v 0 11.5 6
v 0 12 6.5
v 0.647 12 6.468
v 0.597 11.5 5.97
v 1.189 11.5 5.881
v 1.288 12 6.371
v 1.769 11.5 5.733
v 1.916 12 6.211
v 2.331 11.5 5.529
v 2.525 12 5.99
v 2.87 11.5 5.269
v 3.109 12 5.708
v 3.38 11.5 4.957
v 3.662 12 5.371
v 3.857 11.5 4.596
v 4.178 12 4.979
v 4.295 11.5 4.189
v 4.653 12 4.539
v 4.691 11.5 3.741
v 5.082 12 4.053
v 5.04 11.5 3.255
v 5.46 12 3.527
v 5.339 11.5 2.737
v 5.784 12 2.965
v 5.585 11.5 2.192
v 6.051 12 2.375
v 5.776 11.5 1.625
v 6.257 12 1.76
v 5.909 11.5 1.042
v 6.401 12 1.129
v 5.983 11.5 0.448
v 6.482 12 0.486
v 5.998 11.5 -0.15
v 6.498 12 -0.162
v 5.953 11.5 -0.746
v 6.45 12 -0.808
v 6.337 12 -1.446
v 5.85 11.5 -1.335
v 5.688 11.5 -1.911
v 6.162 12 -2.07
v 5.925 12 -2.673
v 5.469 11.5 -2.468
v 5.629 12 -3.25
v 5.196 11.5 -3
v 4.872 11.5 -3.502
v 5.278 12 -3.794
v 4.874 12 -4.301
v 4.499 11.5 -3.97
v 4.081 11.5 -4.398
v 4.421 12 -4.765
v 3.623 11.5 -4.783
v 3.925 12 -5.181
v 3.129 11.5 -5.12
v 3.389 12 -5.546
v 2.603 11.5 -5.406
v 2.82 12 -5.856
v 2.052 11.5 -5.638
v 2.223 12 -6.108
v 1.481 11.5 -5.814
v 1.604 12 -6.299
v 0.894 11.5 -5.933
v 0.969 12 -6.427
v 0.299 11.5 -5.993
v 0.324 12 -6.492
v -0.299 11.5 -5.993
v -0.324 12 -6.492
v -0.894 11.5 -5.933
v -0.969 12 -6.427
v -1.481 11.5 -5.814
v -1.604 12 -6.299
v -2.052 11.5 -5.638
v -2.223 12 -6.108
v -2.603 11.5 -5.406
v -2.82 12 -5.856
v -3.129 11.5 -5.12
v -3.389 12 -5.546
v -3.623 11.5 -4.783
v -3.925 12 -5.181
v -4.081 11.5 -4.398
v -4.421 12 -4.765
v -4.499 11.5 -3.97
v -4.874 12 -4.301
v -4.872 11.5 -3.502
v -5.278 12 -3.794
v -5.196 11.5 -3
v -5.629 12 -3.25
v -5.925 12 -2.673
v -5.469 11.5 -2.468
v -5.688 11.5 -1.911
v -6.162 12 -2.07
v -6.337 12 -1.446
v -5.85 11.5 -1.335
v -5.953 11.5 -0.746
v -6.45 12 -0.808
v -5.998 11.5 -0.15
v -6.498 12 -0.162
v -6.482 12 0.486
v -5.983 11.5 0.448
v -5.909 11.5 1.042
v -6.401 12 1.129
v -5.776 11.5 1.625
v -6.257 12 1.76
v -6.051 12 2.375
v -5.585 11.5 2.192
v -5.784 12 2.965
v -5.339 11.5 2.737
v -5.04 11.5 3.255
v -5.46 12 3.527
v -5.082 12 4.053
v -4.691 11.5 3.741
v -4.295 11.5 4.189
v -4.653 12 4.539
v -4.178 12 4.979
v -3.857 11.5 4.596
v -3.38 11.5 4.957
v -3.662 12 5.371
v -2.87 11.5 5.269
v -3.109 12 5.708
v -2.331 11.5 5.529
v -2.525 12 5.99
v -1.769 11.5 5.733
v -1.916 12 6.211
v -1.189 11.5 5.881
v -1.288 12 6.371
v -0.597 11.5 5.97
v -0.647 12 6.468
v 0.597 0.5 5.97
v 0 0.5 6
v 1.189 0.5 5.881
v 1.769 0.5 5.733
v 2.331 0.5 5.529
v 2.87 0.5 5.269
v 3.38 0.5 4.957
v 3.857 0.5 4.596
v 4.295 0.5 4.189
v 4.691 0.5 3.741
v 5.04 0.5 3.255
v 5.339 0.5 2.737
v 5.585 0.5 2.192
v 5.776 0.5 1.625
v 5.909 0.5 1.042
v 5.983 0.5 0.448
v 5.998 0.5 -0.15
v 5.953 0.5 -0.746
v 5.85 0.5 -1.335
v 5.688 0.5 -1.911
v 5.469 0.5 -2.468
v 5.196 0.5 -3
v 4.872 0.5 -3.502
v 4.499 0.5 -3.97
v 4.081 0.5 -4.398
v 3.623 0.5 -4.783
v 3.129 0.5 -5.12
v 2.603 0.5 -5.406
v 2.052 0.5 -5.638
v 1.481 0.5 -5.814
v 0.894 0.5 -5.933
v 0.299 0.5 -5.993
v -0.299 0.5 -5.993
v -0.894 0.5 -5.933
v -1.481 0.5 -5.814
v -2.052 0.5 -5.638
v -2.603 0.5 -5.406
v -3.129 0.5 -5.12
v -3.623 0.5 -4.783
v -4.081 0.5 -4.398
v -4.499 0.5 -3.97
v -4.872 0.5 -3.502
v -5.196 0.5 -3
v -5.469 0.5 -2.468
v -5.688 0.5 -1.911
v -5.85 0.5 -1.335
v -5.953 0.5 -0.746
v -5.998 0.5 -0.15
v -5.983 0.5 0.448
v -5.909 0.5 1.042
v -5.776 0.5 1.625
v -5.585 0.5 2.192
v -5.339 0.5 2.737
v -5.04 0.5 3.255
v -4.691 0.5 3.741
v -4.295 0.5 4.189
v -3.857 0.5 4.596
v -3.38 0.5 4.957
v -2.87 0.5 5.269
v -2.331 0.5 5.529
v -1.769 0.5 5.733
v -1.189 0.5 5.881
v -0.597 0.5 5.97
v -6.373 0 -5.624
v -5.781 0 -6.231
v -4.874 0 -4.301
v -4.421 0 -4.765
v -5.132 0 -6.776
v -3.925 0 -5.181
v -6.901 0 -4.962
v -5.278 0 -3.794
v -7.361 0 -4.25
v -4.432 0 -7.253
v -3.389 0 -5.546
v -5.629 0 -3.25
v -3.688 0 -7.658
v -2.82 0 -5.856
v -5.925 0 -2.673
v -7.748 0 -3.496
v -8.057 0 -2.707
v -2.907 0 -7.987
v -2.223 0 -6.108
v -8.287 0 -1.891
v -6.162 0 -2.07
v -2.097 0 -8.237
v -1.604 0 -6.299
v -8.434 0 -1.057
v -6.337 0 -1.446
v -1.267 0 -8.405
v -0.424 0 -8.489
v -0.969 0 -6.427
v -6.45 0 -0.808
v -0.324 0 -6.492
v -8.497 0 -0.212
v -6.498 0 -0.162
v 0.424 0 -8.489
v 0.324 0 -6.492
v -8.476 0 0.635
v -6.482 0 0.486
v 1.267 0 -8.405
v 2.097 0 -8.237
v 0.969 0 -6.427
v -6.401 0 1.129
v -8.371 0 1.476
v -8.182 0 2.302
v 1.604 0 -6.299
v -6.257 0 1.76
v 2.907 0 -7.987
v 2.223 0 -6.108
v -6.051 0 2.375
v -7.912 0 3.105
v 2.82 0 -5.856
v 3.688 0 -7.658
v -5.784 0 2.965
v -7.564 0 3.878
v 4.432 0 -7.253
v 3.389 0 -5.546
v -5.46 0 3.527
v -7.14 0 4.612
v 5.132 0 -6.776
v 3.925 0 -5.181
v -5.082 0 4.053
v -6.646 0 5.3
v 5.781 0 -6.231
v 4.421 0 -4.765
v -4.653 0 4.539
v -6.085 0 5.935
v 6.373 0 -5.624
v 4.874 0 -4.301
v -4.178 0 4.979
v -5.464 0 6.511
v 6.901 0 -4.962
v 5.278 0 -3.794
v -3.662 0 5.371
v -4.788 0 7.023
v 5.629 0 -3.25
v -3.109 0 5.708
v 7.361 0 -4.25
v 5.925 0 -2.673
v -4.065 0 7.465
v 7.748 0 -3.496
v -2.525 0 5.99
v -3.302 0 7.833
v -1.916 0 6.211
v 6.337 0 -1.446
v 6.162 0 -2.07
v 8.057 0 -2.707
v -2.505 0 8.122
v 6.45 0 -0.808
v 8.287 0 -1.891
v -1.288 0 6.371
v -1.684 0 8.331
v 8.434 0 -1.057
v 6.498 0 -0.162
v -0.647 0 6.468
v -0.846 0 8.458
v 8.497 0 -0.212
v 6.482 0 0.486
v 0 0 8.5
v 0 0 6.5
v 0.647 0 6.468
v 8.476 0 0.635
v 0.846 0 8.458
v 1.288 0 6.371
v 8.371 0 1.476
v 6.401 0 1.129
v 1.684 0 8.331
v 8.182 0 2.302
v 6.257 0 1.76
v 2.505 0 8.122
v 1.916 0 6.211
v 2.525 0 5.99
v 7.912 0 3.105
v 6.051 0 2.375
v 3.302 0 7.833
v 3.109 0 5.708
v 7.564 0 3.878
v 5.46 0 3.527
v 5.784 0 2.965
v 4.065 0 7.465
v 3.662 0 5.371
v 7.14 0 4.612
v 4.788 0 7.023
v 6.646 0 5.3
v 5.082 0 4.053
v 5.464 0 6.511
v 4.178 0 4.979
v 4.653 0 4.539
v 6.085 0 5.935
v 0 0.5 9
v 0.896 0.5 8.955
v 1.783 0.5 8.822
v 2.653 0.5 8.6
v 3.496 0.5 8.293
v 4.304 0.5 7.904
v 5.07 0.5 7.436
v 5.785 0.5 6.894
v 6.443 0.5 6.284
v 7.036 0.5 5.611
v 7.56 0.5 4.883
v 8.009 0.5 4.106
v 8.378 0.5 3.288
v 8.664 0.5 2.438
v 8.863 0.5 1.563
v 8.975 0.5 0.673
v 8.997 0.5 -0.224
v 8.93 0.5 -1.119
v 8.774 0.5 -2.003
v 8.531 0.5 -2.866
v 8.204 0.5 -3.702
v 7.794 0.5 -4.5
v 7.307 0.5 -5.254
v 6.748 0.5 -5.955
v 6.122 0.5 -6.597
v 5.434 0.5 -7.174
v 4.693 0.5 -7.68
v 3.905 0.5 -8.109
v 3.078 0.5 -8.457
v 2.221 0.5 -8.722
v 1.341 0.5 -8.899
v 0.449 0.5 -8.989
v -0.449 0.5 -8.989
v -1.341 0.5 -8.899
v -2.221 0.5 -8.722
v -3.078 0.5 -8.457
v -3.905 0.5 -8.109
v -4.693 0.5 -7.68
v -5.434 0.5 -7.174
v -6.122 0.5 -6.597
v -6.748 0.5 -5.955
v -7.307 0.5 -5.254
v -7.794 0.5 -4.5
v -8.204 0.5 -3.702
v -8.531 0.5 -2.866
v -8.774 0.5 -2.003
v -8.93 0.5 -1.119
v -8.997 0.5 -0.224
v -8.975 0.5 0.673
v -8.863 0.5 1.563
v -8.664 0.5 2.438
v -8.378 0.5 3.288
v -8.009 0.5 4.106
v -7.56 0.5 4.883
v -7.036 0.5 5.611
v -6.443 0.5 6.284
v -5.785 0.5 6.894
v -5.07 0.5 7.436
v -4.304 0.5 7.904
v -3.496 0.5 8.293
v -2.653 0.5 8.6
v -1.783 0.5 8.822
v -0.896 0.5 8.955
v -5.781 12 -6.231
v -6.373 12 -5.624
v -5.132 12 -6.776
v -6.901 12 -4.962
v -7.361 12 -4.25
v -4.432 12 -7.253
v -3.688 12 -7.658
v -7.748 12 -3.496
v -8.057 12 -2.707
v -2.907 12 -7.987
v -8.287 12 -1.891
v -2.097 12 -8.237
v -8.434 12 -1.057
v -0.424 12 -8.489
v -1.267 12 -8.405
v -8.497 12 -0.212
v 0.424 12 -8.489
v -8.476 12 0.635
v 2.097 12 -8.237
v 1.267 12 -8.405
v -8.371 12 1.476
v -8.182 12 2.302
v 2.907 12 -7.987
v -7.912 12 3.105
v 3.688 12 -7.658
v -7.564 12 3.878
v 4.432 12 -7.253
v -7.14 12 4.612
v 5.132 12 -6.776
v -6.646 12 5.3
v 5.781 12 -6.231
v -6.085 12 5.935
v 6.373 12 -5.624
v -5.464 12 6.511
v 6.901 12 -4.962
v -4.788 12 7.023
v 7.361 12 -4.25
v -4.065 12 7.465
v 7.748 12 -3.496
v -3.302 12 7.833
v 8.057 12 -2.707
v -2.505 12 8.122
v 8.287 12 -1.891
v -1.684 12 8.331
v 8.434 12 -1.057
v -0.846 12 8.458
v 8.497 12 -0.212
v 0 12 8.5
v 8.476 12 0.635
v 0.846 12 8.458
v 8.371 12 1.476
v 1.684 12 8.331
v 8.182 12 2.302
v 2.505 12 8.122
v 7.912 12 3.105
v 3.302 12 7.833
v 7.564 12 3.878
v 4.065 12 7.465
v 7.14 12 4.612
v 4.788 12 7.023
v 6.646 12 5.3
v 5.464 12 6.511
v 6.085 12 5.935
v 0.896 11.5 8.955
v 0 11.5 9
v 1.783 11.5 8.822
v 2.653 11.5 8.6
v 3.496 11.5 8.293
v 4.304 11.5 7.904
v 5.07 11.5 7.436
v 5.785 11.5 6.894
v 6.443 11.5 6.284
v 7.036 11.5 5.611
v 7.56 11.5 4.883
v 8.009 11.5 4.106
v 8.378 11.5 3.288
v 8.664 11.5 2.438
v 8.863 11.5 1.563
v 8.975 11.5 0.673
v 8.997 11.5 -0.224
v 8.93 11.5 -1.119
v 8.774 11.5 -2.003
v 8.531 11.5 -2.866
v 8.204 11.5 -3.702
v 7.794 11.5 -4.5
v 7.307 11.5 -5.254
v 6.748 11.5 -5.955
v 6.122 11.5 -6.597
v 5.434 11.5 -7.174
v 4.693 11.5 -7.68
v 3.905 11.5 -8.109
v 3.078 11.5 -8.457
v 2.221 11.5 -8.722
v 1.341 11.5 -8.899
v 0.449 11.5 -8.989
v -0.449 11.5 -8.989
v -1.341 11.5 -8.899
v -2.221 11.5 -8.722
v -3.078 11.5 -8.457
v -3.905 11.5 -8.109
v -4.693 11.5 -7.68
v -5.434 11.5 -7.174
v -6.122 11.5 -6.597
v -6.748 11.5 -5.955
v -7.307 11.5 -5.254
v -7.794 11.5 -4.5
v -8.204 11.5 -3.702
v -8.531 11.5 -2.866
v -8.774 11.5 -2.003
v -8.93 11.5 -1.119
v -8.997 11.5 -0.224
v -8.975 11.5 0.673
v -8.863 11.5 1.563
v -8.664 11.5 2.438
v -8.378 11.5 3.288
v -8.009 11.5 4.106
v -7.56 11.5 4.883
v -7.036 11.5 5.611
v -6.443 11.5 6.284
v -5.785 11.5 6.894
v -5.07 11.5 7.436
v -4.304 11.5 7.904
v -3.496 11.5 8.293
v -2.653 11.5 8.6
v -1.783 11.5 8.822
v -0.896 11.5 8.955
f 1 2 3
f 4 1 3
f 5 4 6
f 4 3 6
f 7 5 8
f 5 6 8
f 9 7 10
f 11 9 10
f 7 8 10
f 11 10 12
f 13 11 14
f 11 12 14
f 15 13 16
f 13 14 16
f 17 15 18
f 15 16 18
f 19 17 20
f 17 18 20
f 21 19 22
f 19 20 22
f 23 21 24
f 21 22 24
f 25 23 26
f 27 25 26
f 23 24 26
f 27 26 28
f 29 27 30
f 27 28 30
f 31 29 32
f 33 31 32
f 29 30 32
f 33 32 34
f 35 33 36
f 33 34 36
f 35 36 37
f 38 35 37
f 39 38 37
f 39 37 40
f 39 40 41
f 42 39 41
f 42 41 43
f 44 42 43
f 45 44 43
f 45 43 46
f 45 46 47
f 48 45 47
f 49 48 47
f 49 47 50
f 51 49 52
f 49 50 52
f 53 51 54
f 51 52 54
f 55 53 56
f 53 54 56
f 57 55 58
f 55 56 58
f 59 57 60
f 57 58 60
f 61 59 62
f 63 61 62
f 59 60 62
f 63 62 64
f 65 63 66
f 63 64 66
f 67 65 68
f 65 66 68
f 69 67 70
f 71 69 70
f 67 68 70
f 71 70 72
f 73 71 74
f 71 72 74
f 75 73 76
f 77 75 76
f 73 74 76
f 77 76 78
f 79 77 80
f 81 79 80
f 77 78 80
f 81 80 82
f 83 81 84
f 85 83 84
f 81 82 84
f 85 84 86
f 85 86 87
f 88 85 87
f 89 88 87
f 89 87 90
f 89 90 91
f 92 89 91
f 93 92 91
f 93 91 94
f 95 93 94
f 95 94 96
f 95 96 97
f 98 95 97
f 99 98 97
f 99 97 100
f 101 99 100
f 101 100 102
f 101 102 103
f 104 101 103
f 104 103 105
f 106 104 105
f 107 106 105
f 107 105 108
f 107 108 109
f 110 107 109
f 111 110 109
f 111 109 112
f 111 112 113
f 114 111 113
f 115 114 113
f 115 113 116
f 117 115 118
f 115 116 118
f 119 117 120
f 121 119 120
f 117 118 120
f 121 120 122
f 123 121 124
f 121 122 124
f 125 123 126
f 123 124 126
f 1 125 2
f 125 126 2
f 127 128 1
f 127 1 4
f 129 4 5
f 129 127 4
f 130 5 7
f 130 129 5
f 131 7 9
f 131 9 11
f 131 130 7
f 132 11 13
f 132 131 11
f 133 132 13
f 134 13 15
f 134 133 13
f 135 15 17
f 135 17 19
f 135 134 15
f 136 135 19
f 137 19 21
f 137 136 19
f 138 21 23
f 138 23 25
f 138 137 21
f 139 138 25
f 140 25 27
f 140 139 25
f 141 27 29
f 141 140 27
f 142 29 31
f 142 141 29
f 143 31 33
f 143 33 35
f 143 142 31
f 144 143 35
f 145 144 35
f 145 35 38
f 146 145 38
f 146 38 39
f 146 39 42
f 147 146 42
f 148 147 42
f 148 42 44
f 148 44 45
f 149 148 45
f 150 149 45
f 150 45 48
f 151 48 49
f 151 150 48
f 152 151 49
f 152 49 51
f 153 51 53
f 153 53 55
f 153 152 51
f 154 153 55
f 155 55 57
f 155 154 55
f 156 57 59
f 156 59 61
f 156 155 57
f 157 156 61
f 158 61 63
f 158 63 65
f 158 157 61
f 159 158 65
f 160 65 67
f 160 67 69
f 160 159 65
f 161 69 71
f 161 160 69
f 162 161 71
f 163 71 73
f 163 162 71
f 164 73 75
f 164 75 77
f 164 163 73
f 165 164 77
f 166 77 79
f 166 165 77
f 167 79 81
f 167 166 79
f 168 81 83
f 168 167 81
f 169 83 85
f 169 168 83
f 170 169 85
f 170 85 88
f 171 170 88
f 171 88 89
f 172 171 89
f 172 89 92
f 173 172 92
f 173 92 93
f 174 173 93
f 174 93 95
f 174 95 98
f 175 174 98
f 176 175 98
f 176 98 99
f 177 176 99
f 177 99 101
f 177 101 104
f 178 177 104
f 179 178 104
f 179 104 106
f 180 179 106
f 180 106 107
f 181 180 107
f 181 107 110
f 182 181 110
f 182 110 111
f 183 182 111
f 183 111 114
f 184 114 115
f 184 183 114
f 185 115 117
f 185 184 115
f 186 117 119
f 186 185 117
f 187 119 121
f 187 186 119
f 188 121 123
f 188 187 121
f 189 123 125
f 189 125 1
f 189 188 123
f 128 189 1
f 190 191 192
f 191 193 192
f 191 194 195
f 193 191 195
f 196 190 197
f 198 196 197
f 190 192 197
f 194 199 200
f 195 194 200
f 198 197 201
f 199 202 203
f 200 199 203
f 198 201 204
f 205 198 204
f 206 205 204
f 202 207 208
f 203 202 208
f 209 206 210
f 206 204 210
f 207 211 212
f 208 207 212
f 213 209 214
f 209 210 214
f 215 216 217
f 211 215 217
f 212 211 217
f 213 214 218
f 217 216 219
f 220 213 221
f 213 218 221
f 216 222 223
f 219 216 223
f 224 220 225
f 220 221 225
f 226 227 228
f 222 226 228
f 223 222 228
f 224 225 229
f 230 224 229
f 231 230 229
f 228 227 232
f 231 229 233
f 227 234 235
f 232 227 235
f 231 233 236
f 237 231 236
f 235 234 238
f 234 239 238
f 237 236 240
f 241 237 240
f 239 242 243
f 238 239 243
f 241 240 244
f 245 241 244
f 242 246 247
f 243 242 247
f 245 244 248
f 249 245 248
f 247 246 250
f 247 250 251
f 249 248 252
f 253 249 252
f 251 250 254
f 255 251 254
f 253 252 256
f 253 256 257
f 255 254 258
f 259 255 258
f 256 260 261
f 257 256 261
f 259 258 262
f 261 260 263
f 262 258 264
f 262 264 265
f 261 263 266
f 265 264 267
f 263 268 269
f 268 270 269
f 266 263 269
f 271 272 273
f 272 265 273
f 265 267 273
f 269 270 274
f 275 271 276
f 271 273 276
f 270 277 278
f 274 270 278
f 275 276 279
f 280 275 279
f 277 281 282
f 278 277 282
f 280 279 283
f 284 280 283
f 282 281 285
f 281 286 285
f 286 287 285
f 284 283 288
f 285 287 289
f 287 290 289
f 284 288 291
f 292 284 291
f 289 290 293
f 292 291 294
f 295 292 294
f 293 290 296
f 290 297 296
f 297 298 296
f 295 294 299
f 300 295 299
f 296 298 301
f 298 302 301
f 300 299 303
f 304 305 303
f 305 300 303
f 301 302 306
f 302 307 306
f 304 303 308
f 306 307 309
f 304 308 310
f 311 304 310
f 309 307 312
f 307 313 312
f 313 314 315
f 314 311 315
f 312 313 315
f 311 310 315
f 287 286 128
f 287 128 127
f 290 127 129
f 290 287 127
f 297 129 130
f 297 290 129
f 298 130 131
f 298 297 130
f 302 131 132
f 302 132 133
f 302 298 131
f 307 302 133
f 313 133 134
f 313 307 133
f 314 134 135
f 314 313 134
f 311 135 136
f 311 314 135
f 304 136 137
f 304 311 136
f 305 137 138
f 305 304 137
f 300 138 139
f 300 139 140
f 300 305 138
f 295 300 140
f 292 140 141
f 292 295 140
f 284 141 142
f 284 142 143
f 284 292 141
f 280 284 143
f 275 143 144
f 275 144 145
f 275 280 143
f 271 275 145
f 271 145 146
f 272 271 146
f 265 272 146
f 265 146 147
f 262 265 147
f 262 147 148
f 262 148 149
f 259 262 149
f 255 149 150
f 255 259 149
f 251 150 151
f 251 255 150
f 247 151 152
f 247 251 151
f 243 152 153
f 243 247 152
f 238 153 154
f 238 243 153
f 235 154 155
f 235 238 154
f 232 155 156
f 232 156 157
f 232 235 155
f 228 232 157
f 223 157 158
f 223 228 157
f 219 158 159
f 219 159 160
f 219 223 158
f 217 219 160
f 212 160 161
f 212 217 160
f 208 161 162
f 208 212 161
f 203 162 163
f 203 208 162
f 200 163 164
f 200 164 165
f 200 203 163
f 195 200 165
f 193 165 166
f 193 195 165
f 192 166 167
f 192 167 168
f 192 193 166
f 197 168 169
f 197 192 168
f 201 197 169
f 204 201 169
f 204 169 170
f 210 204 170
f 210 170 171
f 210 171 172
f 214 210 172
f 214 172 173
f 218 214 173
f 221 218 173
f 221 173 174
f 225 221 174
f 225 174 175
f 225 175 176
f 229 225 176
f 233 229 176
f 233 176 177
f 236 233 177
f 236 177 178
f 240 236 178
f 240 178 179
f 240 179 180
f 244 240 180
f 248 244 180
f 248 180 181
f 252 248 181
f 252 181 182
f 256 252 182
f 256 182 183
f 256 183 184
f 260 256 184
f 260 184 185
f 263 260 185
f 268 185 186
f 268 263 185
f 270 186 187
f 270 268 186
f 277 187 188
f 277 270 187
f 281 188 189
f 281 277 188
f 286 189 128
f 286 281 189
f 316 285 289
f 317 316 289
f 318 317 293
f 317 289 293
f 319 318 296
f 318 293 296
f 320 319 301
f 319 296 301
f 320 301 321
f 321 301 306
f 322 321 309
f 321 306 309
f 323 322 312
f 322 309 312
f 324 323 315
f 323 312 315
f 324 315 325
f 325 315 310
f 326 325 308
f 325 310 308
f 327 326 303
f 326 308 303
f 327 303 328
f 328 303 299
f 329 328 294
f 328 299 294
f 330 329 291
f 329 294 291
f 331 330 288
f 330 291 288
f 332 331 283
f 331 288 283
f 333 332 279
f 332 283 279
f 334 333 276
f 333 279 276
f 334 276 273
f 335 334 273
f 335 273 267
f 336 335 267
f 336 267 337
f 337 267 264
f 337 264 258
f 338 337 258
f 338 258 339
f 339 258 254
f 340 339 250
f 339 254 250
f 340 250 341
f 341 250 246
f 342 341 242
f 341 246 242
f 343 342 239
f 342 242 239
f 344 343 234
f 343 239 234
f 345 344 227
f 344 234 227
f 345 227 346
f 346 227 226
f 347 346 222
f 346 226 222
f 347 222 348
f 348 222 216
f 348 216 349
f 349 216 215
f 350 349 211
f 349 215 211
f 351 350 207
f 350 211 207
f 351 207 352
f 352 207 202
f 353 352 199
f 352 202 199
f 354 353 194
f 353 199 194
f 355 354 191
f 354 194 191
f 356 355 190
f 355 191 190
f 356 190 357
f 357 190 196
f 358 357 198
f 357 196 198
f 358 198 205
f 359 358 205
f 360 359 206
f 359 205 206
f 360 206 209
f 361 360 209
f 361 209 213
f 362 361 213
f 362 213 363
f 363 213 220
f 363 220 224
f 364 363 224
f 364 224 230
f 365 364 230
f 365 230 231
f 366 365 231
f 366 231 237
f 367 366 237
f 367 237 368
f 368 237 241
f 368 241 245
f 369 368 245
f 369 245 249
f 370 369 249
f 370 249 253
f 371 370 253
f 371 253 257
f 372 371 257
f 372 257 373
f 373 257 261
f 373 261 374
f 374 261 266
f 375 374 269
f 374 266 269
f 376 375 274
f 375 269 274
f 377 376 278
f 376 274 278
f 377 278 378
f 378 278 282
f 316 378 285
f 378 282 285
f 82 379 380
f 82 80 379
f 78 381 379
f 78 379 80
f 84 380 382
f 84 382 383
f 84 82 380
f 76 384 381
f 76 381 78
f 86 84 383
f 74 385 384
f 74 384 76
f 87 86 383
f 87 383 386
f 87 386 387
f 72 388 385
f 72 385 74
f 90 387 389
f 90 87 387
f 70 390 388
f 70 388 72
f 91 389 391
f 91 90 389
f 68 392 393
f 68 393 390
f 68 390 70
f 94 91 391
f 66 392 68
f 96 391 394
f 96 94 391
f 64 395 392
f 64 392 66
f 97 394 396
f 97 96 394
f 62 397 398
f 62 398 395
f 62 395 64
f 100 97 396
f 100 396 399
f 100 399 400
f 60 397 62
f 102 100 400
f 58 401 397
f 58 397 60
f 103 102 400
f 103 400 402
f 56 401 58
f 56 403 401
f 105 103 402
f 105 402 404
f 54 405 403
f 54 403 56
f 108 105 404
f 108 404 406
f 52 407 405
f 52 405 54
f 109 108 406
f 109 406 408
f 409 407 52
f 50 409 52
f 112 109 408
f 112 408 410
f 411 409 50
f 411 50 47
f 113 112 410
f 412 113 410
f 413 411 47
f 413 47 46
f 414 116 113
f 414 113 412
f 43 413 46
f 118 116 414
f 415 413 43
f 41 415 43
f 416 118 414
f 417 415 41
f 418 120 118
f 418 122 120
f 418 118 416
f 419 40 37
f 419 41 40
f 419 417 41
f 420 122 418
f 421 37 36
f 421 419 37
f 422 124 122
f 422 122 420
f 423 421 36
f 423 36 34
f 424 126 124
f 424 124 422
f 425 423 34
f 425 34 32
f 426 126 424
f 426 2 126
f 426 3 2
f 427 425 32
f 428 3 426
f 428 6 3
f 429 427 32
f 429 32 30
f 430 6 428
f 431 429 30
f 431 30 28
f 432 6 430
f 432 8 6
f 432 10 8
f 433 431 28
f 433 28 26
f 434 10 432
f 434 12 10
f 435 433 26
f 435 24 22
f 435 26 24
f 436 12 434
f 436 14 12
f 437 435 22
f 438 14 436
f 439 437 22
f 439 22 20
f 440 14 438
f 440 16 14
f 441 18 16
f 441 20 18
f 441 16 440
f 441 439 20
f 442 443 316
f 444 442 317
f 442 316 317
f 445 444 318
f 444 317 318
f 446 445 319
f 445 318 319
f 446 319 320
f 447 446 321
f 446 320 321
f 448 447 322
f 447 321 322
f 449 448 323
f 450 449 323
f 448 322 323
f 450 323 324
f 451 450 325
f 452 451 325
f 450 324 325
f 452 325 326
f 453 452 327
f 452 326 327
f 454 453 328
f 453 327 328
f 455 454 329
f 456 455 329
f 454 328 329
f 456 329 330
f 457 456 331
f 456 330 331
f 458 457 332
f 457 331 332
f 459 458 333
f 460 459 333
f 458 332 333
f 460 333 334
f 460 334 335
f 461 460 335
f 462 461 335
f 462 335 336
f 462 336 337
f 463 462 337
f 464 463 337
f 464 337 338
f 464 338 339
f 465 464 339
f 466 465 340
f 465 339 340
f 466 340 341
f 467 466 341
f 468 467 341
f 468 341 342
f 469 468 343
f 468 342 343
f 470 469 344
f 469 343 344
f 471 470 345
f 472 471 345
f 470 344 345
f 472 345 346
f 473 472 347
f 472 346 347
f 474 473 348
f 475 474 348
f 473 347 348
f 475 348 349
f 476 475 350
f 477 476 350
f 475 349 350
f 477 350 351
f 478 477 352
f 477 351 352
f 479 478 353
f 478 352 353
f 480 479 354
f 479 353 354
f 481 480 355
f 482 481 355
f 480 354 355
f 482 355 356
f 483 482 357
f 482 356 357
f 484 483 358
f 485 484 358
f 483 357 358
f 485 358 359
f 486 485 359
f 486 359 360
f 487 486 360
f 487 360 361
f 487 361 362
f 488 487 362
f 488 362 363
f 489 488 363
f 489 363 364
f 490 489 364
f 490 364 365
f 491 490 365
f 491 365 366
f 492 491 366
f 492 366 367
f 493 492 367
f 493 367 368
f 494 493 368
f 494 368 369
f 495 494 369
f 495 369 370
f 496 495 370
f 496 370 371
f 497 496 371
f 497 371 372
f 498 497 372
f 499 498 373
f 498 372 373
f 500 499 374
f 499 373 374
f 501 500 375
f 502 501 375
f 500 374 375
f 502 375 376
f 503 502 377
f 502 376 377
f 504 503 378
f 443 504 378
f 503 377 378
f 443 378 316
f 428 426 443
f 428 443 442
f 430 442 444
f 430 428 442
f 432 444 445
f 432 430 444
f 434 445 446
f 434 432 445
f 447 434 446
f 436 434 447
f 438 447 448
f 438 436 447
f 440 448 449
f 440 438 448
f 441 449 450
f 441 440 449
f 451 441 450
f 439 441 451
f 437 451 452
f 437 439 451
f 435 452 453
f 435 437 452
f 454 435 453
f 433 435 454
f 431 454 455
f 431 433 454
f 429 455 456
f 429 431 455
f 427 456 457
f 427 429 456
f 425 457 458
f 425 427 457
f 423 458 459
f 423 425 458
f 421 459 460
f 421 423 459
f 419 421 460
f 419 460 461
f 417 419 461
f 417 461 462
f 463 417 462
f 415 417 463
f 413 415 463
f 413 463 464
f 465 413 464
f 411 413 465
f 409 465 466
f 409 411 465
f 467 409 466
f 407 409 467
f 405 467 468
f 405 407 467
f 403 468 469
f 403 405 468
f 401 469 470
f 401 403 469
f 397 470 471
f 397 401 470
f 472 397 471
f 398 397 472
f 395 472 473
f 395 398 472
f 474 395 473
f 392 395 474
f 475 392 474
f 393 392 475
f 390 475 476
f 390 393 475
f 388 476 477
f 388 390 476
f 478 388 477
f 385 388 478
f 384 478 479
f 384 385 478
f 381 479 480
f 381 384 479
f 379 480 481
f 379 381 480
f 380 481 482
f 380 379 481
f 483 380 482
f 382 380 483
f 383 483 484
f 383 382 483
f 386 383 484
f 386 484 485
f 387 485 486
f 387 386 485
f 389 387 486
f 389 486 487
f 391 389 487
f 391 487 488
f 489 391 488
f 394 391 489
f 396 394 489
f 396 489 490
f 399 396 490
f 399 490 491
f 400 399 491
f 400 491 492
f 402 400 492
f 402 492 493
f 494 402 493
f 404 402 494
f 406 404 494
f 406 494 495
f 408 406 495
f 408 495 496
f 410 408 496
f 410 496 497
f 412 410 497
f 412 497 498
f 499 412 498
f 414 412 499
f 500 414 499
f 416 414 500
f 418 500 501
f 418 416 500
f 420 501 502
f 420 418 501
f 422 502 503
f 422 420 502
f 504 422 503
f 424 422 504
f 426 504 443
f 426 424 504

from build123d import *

# Parameters (mm, degrees)
ESQUISSE1_R        = 9
ESQUISSE1_R_2      = 6
BOSS_EXTRU_1_DEPTH = 12
CHANFREIN1_SIZE    = 0.5


with BuildPart() as part:
    # Esquisse1 → Boss.-Extru.1 (new body)
    with BuildSketch(Plane(origin=(0, 0, 0), x_dir=(1, 0, 0), z_dir=(0, 1, 0))):
        with Locations(Location((0, 0, 0), (0, 0, 270))):  # turned: the seam where the file's is
            Circle(ESQUISSE1_R)
        with Locations(Location((0, 0, 0), (0, 0, 270))):  # turned: the seam where the file's is
            Circle(ESQUISSE1_R_2, mode=Mode.SUBTRACT)
    extrude(amount=BOSS_EXTRU_1_DEPTH)

    # Chanfrein1
    chanfrein1_edges = [part.edges().sort_by_distance(p)[0] for p in [
        (0, 0, -9),
        (0, 12, -9),
        (0, 0, -6),
        (0, 12, -6),
    ]]
    chamfer(chanfrein1_edges, length=CHANFREIN1_SIZE)


solid = part.part
